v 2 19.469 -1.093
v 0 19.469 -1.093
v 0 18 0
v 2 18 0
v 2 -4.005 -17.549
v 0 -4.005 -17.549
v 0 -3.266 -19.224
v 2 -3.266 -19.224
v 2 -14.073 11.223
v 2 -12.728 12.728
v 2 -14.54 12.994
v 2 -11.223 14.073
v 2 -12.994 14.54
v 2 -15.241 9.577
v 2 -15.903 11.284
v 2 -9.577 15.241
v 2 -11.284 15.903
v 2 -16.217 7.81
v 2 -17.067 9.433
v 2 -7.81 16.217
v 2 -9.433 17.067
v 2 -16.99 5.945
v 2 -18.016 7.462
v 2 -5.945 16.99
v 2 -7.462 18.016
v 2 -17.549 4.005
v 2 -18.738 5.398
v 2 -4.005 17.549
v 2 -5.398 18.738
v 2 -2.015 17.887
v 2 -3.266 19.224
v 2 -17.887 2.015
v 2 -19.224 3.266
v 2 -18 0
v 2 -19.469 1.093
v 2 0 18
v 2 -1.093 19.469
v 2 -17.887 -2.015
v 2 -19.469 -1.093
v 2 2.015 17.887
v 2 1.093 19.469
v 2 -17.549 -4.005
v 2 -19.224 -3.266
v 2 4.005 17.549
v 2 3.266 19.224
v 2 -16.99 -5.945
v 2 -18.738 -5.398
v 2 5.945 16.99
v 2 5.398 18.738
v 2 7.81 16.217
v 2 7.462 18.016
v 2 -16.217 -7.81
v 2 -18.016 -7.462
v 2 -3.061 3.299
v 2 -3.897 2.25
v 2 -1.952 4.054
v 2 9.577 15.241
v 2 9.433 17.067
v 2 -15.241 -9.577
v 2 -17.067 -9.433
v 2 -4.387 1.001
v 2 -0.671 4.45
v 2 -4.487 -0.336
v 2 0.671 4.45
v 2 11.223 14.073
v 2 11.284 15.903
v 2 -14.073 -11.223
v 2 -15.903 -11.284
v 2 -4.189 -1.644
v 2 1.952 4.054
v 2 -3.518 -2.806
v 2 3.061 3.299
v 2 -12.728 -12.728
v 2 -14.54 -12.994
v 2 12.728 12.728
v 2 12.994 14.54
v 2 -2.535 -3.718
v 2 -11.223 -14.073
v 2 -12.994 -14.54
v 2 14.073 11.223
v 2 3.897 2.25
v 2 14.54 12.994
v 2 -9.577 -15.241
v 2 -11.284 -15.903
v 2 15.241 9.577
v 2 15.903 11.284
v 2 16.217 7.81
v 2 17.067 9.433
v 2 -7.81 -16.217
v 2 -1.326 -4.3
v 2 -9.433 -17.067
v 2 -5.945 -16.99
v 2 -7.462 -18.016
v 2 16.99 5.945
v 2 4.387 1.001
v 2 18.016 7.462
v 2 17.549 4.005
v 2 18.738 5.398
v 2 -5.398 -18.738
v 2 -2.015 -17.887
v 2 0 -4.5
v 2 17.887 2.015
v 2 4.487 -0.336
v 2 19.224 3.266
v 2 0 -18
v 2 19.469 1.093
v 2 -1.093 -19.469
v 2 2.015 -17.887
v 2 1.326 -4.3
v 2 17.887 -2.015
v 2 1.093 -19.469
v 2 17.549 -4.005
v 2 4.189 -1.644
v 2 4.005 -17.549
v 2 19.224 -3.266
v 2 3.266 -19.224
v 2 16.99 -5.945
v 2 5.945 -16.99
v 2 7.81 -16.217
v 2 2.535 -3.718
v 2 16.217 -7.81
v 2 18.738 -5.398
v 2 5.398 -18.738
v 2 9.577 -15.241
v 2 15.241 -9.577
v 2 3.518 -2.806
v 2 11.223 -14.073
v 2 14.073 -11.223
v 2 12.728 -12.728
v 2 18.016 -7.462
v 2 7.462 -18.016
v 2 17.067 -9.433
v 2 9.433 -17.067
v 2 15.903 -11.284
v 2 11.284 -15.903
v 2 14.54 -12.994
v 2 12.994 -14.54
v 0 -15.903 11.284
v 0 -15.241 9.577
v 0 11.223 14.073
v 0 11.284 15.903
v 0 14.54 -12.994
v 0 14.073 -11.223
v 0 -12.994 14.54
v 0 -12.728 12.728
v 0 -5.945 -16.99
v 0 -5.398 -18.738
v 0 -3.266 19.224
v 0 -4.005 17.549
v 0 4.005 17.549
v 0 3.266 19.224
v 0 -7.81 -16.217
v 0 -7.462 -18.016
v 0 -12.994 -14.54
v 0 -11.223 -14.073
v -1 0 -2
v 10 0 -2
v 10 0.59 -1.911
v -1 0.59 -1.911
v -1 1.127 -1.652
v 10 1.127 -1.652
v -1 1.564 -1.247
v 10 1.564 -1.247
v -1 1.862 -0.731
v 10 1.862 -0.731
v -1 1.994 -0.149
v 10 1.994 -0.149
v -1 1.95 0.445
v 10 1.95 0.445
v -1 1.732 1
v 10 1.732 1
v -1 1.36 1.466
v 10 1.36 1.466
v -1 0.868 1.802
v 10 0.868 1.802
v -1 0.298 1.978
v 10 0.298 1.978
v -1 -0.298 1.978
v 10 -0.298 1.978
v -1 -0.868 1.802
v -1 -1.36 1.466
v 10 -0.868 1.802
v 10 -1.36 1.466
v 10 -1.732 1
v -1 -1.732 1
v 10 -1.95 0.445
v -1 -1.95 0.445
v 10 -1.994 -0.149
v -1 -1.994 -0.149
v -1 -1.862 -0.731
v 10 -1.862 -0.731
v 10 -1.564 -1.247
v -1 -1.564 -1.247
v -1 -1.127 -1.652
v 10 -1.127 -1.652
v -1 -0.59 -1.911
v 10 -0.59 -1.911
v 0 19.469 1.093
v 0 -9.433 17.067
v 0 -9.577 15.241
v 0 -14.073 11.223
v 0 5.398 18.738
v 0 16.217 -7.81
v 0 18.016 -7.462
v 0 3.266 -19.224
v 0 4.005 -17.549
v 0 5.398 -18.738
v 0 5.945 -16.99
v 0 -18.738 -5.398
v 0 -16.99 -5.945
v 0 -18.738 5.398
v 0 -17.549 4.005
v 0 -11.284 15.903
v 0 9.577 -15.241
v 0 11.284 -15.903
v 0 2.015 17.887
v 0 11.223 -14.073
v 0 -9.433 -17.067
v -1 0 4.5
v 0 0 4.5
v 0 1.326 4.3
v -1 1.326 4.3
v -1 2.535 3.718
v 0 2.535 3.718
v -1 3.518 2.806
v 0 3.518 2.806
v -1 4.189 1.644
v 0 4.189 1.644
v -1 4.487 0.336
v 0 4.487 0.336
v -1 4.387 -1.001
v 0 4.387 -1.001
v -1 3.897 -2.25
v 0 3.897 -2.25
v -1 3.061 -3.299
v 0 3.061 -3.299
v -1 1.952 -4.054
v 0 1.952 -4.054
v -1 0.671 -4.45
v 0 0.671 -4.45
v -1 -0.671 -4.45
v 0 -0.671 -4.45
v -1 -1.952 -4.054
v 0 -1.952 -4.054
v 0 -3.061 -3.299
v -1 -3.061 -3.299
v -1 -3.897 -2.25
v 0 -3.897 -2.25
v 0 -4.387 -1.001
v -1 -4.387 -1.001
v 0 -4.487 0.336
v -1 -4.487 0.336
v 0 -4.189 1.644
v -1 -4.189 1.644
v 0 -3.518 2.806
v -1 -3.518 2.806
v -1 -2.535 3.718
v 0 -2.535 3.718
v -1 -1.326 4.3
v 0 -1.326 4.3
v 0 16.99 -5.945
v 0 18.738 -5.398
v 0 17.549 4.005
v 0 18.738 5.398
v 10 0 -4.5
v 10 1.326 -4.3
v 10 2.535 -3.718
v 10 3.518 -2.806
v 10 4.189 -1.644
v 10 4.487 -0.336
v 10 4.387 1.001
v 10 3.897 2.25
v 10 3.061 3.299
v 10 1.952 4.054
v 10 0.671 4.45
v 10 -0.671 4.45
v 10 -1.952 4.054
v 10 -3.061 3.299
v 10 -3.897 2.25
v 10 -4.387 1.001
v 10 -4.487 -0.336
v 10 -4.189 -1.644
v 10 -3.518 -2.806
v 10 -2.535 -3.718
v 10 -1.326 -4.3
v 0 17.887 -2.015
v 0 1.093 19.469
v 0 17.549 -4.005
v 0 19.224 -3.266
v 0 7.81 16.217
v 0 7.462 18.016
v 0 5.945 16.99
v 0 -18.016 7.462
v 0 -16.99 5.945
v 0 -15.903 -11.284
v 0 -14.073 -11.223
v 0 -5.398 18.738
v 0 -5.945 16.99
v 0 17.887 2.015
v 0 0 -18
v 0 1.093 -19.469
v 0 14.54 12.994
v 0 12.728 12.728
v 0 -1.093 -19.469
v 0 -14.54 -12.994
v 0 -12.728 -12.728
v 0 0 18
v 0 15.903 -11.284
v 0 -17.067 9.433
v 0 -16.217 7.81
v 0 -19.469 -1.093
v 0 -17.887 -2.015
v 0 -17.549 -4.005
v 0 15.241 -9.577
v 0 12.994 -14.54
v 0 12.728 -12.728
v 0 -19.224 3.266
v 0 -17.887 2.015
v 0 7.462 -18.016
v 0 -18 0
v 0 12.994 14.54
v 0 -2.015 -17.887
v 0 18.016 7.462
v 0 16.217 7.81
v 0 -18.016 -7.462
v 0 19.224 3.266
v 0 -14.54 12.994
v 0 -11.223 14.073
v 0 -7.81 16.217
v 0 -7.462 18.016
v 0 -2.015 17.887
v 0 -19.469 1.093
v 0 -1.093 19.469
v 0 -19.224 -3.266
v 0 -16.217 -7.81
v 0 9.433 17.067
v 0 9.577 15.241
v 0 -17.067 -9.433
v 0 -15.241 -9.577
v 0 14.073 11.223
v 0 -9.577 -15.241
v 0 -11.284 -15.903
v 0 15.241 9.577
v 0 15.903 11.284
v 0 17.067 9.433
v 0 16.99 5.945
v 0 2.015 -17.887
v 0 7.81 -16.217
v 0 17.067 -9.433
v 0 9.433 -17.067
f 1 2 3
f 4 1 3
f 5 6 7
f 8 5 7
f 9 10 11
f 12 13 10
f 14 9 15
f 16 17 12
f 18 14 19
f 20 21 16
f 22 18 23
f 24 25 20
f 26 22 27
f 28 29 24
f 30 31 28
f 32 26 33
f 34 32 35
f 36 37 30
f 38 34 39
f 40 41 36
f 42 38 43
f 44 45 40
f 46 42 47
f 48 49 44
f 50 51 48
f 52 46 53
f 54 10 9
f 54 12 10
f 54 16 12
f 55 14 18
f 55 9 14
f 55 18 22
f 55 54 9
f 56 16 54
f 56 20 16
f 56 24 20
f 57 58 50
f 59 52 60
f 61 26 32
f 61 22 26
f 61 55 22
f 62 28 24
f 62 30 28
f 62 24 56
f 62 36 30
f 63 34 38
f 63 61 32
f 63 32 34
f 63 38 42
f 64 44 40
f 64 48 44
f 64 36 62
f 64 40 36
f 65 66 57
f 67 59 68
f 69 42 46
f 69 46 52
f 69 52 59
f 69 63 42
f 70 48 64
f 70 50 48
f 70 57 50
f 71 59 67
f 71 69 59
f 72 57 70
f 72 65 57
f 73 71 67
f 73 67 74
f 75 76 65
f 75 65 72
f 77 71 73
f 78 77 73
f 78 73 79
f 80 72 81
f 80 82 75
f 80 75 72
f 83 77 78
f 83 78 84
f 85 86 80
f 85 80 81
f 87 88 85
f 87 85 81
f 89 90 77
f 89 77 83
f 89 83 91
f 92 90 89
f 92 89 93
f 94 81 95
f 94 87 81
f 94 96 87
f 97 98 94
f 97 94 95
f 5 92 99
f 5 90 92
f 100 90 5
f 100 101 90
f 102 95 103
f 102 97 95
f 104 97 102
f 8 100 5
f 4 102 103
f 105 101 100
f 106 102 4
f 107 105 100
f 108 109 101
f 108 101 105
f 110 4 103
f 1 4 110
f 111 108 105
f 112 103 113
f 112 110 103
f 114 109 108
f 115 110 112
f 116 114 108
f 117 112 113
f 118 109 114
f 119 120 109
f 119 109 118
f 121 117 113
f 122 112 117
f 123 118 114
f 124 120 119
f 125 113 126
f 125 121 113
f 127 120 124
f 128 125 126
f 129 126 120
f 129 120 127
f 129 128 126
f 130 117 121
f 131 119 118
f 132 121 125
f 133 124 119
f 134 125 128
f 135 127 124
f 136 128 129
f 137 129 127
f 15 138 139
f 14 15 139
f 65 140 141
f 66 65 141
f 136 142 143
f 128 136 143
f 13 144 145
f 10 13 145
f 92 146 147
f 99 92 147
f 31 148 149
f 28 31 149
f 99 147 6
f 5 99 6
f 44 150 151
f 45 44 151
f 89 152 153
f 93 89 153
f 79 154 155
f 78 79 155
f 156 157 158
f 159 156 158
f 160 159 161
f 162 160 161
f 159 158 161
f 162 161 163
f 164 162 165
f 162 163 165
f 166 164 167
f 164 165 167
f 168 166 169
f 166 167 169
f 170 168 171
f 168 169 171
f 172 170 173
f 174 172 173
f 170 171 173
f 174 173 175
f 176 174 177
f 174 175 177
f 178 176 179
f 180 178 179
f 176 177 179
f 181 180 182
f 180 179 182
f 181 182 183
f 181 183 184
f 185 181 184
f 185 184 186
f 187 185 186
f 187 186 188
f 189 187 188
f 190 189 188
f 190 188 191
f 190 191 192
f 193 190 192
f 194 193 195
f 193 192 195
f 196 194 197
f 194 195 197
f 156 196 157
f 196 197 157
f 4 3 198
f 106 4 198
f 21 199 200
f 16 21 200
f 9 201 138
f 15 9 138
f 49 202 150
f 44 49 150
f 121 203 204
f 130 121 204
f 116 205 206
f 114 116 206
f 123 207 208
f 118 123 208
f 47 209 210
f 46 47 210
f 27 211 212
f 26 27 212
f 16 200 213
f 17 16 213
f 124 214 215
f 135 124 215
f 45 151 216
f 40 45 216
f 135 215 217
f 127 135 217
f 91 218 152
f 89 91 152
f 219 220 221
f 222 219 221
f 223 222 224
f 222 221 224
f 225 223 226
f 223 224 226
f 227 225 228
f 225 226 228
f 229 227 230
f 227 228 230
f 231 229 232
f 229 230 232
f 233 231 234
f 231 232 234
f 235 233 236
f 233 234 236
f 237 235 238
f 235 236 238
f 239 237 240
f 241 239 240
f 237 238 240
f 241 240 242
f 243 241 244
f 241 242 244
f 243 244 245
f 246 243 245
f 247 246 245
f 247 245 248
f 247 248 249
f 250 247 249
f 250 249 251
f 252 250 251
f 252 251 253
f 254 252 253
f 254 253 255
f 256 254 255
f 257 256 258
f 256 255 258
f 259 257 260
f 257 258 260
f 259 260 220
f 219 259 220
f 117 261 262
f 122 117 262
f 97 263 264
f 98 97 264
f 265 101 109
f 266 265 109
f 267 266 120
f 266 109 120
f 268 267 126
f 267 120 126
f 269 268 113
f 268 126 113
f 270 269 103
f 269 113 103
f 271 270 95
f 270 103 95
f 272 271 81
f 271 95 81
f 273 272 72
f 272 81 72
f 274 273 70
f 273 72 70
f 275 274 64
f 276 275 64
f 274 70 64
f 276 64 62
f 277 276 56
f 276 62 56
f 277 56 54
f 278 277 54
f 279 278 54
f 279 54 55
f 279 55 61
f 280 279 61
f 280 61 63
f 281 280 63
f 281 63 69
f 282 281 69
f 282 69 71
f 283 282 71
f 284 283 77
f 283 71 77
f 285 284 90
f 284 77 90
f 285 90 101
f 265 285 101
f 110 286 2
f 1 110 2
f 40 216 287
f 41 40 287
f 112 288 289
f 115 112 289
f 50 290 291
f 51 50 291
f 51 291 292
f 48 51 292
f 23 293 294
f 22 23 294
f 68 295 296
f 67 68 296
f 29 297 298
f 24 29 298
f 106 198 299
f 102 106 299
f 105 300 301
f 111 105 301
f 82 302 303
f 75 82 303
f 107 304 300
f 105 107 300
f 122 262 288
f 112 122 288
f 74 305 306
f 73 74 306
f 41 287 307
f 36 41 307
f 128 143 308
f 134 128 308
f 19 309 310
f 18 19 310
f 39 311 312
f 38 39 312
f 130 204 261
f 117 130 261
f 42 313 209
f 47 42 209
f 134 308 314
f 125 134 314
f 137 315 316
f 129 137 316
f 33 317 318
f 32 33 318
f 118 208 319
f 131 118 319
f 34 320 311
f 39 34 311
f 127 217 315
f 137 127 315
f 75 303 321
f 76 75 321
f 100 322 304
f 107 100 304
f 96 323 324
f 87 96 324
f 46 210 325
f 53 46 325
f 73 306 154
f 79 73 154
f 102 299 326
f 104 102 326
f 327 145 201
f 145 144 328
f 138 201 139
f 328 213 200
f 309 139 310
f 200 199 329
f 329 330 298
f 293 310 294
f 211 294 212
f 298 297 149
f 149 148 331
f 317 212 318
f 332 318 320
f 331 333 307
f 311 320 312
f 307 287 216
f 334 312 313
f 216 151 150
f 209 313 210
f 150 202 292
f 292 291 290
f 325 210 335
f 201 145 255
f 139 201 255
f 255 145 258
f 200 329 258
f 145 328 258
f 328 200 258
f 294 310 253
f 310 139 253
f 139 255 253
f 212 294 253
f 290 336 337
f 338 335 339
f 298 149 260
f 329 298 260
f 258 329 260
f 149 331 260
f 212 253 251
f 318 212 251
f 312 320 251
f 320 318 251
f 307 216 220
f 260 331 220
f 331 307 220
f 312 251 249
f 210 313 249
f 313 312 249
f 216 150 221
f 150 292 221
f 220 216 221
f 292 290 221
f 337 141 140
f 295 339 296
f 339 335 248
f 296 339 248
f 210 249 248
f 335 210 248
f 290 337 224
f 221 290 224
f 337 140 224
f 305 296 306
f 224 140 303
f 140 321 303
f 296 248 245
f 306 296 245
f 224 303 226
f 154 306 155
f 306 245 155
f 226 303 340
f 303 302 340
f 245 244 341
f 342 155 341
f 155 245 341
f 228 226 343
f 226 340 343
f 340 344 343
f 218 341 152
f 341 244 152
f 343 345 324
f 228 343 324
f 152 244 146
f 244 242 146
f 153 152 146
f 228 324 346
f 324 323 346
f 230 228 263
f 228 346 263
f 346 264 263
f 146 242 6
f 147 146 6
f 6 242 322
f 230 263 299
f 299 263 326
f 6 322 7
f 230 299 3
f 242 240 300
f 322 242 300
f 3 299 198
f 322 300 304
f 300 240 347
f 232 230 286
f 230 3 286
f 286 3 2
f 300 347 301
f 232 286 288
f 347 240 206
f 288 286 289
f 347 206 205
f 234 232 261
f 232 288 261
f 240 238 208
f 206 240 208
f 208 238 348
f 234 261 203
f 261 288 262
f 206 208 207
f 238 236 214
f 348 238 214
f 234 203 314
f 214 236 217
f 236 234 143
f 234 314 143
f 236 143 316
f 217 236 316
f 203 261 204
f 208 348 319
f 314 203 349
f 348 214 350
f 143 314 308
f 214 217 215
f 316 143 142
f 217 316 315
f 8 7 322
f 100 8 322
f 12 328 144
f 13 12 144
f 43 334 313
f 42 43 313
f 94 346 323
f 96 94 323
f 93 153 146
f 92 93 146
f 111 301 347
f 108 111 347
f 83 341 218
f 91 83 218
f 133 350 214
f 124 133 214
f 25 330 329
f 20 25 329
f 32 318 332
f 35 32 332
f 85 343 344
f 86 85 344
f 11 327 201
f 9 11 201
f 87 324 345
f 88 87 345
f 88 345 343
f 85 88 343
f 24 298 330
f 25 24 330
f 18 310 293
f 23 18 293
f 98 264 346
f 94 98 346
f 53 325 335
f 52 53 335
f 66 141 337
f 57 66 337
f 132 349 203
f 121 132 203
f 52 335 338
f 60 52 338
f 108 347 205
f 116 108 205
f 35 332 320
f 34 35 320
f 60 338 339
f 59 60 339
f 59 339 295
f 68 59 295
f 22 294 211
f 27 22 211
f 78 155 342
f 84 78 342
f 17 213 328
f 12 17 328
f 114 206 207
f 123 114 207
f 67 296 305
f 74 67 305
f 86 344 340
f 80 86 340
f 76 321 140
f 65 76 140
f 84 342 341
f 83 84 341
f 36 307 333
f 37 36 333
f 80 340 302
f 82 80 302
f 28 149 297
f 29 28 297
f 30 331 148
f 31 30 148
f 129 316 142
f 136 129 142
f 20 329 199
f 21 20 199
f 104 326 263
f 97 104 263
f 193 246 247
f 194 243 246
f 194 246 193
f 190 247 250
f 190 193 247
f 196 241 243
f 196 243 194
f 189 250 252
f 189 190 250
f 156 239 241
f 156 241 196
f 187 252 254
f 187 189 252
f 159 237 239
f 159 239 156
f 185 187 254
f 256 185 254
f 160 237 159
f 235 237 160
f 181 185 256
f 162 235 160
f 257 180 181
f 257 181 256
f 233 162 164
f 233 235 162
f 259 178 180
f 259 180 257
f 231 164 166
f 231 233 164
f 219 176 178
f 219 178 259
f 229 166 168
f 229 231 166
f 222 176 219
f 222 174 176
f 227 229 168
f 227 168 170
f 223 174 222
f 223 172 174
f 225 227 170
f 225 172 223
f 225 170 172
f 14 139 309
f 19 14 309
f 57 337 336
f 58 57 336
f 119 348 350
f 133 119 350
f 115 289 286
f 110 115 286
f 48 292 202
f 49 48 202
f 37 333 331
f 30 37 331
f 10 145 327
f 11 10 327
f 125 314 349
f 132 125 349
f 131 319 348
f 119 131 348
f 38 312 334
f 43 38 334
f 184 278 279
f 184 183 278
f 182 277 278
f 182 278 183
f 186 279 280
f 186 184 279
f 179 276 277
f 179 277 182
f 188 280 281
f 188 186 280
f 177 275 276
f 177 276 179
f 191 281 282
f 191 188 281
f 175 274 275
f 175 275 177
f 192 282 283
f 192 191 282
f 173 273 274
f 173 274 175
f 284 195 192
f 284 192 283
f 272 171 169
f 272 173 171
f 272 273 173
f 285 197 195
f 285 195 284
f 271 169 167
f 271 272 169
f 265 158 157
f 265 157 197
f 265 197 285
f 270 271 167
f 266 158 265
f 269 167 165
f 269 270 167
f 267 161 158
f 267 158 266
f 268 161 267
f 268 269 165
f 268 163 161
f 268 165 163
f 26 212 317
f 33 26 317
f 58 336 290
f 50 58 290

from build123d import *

# Parameters (mm, degrees)
SKETCH1_R           = 19.5
BOSS_EXTRUDE1_DEPTH = 2
SKETCH2_R           = 4.5
BOSS_EXTRUDE2_DEPTH = 8
SKETCH3_R           = 4.5
BOSS_EXTRUDE3_DEPTH = 1
SKETCH4_R           = 2
CUT_EXTRUDE1_DEPTH  = 11
CUT_EXTRUDE5_DEPTH  = 2
CIRPATTERN1_COUNT   = 56


with BuildPart() as part:
    # Sketch1 → Boss-Extrude1 (new body)
    with BuildSketch(Plane(origin=(0, 0, 0), x_dir=(0, 0, -1), z_dir=(1, 0, 0))):
        Circle(SKETCH1_R)
    extrude(amount=BOSS_EXTRUDE1_DEPTH)

    # Sketch2 → Boss-Extrude2 (add)
    with BuildSketch(Plane(origin=(2, 0, 0), x_dir=(0, 0, -1), z_dir=(1, 0, 0))):
        Circle(SKETCH2_R)
    extrude(amount=BOSS_EXTRUDE2_DEPTH)

    # Sketch3 → Boss-Extrude3 (add)
    with BuildSketch(Plane.ZY):
        Circle(SKETCH3_R)
    extrude(amount=BOSS_EXTRUDE3_DEPTH)

    # Sketch4 → Cut-Extrude1 (cut)
    with BuildSketch(Plane(origin=(10, 0, 0), x_dir=(0, 0, -1), z_dir=(1, 0, 0))):
        Circle(SKETCH4_R)
    extrude(amount=-CUT_EXTRUDE1_DEPTH, mode=Mode.SUBTRACT)

    # Sketch5 → Cut-Extrude5 (cut)
    with BuildSketch(Plane.ZY):
        with BuildLine():
            Line((-1.093373721, 19.469322893), (0, 18))
            Line((0, 18), (1.09337372, 19.469322893))
            ThreePointArc((1.09337372, 19.469322893), (-1e-09, 19.5), (-1.093373721, 19.469322893))
        make_face()
    cut_extrude5 = extrude(amount=-CUT_EXTRUDE5_DEPTH, mode=Mode.SUBTRACT)

    # CirPattern1: Cut-Extrude5 ×56 about axis
    cirpattern1_axis = Axis((0, 0, 0), (1, 0, 0))
    for i in range(1, CIRPATTERN1_COUNT):
        add(cut_extrude5.rotate(cirpattern1_axis, i * 360 / CIRPATTERN1_COUNT), mode=Mode.SUBTRACT)


solid = part.part
